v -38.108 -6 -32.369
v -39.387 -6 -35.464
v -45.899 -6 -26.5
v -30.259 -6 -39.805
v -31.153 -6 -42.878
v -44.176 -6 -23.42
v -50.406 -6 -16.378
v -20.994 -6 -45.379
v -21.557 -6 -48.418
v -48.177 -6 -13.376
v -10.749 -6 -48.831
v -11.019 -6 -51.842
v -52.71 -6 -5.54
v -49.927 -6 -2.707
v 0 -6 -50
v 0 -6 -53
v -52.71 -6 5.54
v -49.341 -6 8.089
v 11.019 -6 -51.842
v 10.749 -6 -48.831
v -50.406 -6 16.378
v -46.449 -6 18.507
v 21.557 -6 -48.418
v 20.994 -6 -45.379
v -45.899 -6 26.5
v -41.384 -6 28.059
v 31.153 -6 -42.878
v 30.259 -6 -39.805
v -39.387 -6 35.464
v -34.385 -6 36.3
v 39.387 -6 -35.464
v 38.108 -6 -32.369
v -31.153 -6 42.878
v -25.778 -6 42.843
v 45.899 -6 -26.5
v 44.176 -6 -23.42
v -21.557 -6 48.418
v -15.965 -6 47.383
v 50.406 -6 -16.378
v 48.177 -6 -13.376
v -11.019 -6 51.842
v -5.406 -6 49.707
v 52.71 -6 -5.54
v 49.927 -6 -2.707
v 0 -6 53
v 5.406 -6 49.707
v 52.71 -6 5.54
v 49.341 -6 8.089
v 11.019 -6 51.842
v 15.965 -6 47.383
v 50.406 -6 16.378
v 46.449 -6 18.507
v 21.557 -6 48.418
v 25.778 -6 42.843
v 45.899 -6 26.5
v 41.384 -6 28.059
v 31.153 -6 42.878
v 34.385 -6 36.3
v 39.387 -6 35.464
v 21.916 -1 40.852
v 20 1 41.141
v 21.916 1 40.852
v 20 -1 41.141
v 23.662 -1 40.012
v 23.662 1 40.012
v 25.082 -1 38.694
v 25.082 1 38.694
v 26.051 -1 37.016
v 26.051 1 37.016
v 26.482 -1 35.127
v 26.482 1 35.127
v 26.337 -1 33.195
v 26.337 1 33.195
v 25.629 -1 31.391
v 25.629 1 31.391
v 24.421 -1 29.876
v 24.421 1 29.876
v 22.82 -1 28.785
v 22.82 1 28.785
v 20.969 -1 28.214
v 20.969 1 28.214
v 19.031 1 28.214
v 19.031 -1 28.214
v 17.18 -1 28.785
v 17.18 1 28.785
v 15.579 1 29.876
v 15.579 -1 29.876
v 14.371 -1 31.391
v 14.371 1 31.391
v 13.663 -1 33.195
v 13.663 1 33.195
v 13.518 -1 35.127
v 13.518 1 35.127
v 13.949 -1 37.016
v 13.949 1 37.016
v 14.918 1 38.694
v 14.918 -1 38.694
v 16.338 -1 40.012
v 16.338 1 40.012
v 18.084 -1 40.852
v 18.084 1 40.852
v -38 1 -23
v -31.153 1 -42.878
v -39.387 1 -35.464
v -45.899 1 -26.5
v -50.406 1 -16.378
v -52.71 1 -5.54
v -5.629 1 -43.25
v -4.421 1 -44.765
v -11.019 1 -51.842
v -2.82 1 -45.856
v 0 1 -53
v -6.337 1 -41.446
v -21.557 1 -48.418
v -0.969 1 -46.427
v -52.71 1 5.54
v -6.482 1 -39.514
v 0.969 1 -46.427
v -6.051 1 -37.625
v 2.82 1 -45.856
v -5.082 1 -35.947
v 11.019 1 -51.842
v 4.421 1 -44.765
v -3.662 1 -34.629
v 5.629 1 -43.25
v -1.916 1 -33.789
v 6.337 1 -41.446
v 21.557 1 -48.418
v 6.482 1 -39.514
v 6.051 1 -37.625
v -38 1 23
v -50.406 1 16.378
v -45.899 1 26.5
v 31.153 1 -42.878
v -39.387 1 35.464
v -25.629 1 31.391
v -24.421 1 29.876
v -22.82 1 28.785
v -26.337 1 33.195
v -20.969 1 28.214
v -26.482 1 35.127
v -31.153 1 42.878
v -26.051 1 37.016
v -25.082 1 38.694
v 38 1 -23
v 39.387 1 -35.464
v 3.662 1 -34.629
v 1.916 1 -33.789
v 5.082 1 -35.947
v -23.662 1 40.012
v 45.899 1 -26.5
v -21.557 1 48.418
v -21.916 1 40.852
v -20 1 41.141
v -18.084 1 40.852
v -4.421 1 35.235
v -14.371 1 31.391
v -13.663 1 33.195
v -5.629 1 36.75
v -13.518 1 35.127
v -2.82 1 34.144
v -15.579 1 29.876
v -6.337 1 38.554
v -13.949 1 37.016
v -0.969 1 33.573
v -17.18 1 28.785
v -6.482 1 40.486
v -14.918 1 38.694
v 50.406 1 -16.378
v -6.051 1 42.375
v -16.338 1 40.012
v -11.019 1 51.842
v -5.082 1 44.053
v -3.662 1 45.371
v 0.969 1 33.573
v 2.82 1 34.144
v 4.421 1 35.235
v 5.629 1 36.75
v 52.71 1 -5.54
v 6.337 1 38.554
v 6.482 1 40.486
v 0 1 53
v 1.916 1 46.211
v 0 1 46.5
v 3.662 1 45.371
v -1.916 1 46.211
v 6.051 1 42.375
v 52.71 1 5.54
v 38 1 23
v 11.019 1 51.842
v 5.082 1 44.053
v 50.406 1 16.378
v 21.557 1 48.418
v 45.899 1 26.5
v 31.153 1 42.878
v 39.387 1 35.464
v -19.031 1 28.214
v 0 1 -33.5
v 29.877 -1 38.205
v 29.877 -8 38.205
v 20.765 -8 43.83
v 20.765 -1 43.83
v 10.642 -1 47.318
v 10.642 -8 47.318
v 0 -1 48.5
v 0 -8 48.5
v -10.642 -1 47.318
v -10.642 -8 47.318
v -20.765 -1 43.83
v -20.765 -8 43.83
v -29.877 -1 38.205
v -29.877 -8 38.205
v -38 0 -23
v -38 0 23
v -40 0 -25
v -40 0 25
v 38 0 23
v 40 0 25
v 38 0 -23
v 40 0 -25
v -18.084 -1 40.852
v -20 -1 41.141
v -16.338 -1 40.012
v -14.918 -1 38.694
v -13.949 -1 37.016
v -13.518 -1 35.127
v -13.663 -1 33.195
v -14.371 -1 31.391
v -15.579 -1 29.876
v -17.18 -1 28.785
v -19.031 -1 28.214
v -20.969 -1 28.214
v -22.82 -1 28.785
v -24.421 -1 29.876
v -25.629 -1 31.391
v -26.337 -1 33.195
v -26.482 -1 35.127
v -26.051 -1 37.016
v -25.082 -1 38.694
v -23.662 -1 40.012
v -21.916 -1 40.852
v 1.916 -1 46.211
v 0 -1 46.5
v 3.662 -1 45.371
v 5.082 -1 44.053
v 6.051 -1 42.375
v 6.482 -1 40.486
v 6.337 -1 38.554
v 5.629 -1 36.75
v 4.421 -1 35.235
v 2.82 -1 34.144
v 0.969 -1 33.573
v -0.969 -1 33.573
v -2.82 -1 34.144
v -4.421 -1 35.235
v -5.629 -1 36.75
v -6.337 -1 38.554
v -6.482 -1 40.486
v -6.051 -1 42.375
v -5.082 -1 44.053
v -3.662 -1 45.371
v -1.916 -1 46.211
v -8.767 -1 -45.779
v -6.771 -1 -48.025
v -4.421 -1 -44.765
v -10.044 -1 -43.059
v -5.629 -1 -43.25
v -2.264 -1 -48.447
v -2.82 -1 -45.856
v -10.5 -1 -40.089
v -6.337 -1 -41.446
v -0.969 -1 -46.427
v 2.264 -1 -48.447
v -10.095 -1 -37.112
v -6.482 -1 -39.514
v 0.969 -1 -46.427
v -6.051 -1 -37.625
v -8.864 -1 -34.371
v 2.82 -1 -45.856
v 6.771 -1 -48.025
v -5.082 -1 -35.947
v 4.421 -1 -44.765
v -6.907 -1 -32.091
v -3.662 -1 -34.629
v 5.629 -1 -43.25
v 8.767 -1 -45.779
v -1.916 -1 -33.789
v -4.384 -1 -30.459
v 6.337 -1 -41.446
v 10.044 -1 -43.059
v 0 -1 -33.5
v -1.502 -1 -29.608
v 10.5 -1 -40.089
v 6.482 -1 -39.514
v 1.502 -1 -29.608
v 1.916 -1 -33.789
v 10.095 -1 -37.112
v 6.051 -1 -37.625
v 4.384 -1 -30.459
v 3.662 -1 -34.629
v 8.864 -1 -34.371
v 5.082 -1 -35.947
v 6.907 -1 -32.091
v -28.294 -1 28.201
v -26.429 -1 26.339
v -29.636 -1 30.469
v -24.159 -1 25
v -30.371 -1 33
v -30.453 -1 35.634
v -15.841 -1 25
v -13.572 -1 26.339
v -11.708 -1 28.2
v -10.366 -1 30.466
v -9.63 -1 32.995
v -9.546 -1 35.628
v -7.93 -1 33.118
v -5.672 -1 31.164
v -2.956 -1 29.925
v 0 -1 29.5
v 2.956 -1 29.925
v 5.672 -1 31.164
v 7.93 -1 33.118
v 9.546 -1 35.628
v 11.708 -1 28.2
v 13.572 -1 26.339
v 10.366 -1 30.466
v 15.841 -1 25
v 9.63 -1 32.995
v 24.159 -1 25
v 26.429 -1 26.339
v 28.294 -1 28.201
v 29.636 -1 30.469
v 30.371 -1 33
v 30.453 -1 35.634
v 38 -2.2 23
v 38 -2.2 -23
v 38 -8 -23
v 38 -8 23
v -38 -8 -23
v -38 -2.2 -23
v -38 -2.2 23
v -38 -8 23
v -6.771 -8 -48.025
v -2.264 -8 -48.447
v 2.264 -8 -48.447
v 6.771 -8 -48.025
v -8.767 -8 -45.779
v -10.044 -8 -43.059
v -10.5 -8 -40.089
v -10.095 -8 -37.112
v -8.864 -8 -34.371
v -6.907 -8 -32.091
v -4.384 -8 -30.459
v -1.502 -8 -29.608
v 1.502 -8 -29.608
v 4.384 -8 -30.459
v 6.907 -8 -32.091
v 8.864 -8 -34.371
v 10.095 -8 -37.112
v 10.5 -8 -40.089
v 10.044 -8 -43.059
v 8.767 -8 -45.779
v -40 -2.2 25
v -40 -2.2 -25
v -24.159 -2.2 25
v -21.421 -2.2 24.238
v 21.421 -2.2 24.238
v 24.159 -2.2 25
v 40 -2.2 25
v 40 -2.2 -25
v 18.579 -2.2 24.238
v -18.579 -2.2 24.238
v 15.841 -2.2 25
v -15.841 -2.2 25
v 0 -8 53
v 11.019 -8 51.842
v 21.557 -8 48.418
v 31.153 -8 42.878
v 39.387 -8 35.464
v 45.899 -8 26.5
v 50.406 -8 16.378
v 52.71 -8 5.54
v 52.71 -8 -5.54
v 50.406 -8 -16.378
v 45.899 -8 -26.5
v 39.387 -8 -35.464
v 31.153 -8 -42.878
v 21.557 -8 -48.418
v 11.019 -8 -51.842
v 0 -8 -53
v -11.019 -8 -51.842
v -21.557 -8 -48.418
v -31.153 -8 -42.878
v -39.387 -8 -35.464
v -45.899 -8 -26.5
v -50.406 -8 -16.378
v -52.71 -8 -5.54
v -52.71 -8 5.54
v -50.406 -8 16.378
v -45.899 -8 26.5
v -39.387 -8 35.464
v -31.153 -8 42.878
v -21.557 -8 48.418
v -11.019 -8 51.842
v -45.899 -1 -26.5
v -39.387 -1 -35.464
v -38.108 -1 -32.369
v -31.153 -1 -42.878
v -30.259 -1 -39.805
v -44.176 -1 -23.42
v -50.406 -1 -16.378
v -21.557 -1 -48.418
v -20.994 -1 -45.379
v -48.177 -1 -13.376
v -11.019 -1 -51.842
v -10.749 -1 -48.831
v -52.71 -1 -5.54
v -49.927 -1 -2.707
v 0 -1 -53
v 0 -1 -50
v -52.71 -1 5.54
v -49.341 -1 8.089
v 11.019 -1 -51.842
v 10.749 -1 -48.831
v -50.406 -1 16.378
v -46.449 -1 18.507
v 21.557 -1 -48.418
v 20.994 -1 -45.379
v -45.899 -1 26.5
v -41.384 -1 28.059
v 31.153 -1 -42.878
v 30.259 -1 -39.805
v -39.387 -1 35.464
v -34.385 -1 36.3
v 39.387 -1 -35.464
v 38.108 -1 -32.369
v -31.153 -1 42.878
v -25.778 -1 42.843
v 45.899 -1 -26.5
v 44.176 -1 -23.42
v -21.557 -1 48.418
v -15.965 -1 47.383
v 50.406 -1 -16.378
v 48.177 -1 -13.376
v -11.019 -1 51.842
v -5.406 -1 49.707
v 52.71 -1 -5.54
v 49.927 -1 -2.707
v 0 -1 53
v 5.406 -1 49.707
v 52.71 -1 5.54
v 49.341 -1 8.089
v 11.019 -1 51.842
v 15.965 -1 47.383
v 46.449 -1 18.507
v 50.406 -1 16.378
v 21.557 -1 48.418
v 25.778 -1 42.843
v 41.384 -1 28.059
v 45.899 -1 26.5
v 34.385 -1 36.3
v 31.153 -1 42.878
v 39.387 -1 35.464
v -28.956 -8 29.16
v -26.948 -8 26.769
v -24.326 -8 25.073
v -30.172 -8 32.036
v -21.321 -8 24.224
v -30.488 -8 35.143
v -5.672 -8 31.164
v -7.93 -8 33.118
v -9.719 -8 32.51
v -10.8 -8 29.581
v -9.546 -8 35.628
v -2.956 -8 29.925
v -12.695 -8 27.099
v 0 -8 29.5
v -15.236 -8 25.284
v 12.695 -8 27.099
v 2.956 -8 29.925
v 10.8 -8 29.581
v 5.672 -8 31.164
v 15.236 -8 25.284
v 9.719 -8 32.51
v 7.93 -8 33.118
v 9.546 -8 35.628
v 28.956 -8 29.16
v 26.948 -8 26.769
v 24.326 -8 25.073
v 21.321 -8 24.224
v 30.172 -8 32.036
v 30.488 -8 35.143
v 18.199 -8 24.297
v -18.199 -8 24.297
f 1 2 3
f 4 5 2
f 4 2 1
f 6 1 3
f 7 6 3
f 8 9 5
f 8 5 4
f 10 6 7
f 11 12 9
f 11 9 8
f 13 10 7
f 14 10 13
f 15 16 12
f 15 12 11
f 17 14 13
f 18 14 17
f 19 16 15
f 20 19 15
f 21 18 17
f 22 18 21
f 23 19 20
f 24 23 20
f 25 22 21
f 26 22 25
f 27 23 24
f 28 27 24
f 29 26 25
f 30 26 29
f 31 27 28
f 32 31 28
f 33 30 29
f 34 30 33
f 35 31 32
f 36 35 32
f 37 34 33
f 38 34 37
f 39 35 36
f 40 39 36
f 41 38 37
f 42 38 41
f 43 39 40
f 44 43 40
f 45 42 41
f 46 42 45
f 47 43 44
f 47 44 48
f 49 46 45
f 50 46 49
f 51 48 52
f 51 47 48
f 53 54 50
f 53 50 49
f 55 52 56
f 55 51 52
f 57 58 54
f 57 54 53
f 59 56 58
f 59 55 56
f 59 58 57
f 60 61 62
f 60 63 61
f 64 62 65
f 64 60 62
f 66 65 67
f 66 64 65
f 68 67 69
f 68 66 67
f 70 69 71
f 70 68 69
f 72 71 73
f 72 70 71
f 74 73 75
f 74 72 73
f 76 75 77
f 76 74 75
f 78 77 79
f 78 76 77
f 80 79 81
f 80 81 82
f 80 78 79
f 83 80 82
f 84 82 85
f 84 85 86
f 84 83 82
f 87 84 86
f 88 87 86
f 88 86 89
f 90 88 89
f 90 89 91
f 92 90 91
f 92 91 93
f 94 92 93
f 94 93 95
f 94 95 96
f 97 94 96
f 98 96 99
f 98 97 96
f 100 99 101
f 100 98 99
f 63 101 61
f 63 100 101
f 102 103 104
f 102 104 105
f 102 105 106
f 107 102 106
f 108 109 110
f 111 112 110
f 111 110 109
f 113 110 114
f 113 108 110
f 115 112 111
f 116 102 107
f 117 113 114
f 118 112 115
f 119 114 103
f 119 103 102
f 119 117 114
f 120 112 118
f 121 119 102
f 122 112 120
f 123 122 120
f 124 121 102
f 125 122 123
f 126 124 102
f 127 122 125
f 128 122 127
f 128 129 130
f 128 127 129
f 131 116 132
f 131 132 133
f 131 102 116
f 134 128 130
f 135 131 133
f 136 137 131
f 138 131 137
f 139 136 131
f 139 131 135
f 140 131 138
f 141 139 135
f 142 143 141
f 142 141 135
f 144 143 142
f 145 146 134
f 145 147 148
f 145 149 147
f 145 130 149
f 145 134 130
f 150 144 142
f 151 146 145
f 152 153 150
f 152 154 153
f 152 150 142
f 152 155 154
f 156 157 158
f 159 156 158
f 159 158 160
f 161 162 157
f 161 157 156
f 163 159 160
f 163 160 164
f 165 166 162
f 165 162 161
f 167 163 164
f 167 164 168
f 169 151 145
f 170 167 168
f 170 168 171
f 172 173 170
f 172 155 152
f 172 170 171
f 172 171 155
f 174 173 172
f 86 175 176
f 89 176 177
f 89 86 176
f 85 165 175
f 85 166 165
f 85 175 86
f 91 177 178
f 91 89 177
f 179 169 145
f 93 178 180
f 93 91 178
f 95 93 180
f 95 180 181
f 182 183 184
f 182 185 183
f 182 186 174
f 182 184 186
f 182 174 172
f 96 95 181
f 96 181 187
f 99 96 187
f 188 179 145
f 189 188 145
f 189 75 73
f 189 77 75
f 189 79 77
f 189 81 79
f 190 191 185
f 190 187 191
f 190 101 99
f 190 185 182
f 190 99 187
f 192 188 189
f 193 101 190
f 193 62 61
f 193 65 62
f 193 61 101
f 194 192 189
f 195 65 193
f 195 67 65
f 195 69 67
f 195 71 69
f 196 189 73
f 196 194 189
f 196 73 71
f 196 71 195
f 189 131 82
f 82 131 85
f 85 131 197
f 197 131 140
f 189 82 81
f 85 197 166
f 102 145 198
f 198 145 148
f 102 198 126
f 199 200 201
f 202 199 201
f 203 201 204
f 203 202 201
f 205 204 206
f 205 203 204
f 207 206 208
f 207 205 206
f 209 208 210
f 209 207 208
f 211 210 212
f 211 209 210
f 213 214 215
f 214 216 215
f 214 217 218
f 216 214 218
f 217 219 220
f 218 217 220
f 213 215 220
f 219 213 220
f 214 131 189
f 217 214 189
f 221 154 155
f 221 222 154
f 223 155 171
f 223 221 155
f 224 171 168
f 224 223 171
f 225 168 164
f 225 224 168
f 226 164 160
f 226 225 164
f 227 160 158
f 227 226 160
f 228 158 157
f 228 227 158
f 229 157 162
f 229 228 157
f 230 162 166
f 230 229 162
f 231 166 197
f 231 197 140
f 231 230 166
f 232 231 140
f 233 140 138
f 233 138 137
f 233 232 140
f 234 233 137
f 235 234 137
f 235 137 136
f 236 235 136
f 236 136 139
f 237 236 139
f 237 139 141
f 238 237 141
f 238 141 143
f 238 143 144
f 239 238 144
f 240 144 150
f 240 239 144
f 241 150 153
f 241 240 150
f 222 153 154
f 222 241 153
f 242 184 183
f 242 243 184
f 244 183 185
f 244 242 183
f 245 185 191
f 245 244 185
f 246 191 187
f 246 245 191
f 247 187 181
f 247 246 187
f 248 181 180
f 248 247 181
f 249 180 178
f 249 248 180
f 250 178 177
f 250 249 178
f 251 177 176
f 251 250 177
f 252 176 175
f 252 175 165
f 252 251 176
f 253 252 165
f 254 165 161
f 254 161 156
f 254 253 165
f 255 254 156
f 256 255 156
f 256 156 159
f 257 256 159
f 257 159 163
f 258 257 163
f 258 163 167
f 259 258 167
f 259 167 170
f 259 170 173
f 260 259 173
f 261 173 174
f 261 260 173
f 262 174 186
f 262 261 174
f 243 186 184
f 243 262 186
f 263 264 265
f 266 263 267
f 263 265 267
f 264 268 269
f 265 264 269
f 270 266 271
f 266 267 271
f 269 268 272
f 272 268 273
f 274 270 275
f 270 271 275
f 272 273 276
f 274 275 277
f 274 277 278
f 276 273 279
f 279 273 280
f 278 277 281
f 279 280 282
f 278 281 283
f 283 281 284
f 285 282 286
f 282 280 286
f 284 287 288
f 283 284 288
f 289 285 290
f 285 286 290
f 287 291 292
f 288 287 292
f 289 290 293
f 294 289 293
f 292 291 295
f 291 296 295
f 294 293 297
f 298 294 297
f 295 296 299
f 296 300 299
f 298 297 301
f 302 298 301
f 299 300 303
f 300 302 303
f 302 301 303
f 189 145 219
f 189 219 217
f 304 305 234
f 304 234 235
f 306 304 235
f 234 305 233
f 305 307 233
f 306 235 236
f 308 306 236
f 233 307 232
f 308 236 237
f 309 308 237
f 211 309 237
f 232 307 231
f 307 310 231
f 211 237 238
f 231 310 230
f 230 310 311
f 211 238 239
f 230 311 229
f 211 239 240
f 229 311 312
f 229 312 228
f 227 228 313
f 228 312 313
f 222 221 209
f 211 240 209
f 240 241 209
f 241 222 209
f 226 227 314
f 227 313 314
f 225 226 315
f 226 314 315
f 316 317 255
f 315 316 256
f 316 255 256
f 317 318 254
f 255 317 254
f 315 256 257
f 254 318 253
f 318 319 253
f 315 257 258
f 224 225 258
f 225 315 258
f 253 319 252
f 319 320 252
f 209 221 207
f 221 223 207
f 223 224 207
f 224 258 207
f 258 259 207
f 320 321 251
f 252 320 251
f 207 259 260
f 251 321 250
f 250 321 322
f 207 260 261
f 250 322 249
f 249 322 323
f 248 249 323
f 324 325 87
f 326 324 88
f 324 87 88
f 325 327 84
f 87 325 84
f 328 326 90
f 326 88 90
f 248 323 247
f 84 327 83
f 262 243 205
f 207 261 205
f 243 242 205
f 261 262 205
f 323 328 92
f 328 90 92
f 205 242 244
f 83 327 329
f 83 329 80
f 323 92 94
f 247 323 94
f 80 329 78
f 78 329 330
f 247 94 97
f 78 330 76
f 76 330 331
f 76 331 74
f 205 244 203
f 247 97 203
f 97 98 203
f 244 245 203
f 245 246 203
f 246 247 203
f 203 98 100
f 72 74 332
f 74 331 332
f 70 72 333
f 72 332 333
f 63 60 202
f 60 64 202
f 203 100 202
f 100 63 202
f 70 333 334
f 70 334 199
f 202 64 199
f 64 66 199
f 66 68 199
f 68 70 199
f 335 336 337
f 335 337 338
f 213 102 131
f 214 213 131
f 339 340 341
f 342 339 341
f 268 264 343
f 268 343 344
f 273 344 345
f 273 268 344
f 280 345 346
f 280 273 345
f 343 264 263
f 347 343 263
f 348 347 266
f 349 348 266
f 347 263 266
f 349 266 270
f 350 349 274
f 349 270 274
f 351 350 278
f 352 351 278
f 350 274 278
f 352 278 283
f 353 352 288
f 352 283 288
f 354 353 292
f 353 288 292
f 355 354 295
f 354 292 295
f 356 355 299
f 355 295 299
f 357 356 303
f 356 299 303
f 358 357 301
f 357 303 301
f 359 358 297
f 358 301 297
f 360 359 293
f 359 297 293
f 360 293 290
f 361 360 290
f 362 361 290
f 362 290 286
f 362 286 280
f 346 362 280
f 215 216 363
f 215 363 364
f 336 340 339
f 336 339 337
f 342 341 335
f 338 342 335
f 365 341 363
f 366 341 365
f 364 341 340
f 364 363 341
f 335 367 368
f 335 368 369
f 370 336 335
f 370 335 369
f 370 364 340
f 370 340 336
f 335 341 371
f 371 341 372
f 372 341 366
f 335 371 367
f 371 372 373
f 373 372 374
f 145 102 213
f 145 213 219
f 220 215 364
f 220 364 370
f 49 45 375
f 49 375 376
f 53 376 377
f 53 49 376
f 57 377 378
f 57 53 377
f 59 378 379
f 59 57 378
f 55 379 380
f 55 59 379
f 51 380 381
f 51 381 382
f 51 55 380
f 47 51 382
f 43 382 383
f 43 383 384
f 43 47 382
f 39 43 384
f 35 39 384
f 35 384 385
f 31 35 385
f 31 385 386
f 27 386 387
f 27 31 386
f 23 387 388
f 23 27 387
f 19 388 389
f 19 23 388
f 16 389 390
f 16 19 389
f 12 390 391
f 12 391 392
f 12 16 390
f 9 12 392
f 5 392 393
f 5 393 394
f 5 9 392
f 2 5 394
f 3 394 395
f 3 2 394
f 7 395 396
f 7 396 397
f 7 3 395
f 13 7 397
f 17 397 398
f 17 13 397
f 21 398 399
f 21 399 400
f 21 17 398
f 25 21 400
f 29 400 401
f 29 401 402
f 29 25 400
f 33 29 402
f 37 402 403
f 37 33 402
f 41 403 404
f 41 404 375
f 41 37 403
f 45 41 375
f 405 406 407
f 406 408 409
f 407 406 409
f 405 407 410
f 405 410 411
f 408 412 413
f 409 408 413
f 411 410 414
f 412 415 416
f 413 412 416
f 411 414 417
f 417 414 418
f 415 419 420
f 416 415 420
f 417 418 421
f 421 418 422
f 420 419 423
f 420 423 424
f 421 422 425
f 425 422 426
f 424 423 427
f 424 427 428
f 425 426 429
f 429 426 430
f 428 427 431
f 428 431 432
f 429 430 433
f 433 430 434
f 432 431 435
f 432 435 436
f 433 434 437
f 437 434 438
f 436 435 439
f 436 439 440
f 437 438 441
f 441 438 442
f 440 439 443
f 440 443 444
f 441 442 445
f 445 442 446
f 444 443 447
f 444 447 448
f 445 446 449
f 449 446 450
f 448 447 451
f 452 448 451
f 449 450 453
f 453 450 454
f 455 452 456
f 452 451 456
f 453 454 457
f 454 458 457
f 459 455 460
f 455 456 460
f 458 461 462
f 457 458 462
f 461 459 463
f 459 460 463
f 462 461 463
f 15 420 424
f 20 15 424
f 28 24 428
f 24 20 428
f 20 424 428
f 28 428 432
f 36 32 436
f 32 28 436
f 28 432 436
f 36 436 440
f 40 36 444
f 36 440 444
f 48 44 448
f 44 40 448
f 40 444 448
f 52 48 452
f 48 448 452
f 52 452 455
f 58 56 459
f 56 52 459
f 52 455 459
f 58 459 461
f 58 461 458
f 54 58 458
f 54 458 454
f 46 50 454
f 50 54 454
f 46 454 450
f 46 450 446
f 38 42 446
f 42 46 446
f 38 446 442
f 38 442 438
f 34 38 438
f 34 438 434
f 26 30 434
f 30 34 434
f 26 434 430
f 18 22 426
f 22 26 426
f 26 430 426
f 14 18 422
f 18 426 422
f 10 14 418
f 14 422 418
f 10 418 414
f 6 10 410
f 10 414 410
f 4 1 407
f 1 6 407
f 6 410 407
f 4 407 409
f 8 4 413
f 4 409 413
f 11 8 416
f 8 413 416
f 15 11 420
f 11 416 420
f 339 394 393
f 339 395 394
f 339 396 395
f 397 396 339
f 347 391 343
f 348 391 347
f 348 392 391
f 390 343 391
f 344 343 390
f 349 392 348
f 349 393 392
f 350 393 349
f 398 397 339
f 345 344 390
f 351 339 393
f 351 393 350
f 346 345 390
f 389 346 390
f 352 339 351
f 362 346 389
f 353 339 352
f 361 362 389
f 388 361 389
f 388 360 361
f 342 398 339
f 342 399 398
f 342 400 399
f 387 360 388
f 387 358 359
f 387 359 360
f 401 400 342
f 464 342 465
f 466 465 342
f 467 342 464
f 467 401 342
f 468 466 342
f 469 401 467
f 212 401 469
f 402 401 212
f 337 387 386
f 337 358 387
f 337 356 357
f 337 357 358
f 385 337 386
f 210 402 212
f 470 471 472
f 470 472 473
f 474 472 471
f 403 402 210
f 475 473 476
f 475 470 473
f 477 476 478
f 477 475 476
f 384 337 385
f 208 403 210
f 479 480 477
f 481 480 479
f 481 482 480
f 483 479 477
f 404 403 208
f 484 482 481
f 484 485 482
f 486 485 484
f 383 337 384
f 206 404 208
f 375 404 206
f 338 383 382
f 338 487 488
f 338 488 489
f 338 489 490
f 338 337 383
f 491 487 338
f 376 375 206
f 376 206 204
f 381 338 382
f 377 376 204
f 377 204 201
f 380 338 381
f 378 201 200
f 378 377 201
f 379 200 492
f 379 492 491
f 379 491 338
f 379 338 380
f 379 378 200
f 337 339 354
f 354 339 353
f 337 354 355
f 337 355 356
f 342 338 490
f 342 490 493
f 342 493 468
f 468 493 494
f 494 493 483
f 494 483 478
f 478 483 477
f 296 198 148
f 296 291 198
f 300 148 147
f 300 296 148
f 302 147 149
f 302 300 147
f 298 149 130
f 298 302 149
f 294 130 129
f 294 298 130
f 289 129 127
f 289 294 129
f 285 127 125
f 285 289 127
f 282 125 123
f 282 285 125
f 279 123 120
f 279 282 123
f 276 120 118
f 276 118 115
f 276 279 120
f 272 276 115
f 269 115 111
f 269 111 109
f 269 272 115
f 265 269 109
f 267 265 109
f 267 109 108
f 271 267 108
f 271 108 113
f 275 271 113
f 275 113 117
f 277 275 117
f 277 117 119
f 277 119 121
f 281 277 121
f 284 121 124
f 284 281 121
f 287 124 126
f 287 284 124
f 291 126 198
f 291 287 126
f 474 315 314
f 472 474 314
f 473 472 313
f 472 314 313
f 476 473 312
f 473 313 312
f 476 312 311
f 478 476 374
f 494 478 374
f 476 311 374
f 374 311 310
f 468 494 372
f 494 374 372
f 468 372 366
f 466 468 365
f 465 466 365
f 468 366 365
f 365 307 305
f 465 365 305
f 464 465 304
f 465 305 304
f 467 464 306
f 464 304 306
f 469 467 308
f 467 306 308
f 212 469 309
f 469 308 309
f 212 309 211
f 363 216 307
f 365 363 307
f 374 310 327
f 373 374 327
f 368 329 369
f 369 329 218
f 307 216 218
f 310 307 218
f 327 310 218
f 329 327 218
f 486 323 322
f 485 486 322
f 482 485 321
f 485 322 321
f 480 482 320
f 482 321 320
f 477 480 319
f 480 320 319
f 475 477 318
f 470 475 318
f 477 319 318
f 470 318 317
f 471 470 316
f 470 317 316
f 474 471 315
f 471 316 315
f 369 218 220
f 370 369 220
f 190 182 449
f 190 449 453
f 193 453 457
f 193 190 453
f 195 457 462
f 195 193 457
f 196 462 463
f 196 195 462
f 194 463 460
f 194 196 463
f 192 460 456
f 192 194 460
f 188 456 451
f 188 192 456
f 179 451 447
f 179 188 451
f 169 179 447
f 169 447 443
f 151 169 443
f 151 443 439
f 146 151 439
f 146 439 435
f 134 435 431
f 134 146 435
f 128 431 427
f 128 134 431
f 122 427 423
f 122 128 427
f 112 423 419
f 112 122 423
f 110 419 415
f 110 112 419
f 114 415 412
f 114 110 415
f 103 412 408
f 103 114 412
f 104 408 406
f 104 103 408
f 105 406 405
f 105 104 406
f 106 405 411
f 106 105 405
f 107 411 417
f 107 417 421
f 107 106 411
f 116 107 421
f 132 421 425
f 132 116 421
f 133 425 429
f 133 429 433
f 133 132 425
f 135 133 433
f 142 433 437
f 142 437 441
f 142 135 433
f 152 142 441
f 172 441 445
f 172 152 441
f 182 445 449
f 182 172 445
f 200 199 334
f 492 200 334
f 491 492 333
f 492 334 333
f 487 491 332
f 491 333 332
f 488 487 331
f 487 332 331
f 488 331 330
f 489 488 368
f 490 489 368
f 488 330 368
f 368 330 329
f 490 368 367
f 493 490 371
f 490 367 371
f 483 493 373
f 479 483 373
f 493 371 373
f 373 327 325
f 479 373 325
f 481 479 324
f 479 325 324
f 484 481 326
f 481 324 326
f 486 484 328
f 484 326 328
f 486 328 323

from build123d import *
from build123d.topology import SkipClean

# Parameters (mm, degrees)
SKETCH1_R           = 50
SKETCH1_R_2         = 6.5
SKETCH1_W           = 76
SKETCH1_H           = 46
BOSS_EXTRUDE1_DEPTH = 1
SKETCH2_R           = 50
SKETCH2_R_2         = 48.5
BOSS_EXTRUDE2_DEPTH = 7
SKETCH3_R           = 53
SKETCH3_R_2         = 50
BOSS_EXTRUDE3_DEPTH = 2
BOSS_EXTRUDE4_START = -7
SKETCH3_2_R         = 53
SKETCH3_2_R_2       = 50
BOSS_EXTRUDE4_DEPTH = 2
SKETCH5_W           = 76
SKETCH5_H           = 46
BOSS_EXTRUDE5_DEPTH = 7
SKETCH4_W           = 80
SKETCH4_H           = 50
CUT_EXTRUDE1_DEPTH  = 2.2


with BuildPart() as part:
    # Sketch1 → Boss-Extrude1 (new, symmetric)
    with BuildSketch(Plane(origin=(0, 0, 0), x_dir=(1, 0, 0), z_dir=(0, 1, 0))):
        with Locations(Location((0, 0, 0), (0, 0, 270))):
            Circle(SKETCH1_R)
        with Locations(Location((0, 40, 0), (0, 0, 270))):
            Circle(SKETCH1_R_2, mode=Mode.SUBTRACT)
        with Locations(Location((0, -40, 0), (0, 0, 270))):
            Circle(SKETCH1_R_2, mode=Mode.SUBTRACT)
        with Locations(Location((20, -34.641016151, 0), (0, 0, 270))):
            Circle(SKETCH1_R_2, mode=Mode.SUBTRACT)
        with Locations(Location((-20, -34.641016151, 0), (0, 0, 270))):
            Circle(SKETCH1_R_2, mode=Mode.SUBTRACT)
        Rectangle(SKETCH1_W, SKETCH1_H, mode=Mode.SUBTRACT)
    extrude(amount=BOSS_EXTRUDE1_DEPTH, both=True)

    # Sketch2 → Boss-Extrude2 (add)
    with SkipClean():  # the faces are left unmerged after this step: merging them gives an invalid solid
        with BuildSketch(Plane.XZ.offset(1)):
            with Locations(Location((0, 0, 0), (0, 0, 270))):
                Circle(SKETCH2_R)
            with Locations(Location((0, 0, 0), (0, 0, 270))):
                Circle(SKETCH2_R_2, mode=Mode.SUBTRACT)
        extrude(amount=BOSS_EXTRUDE2_DEPTH)

    # Sketch3 → Boss-Extrude3 (add)
    with BuildSketch(Plane(origin=(0, 1, 0), x_dir=(1, 0, 0), z_dir=(0, 1, 0))):
        with Locations(Location((0, 0, 0), (0, 0, 270))):
            Circle(SKETCH3_R)
        with Locations(Location((0, 0, 0), (0, 0, 90))):
            Circle(SKETCH3_R_2, mode=Mode.SUBTRACT)
    extrude(amount=-BOSS_EXTRUDE3_DEPTH)

    # Sketch3<2> → Boss-Extrude4 (add)
    with BuildSketch(Plane(origin=(0, 1, 0), x_dir=(1, 0, 0), z_dir=(0, 1, 0)).offset(BOSS_EXTRUDE4_START)):
        with Locations(Location((0, 0, 0), (0, 0, 270))):
            Circle(SKETCH3_2_R)
        with Locations(Location((0, 0, 0), (0, 0, 90))):
            Circle(SKETCH3_2_R_2, mode=Mode.SUBTRACT)
    extrude(amount=-BOSS_EXTRUDE4_DEPTH)

    # Sketch5 → Boss-Extrude5 (add, through all)
    with BuildSketch(Plane.XZ.offset(1)):
        with BuildLine():
            ThreePointArc((29.876545638, 38.205261689), (21.320536736, 24.224386047), (9.54648854, 35.627980267))
            ThreePointArc((9.54648854, 35.627980267), (0, 29.5), (-9.54648854, 35.627980267))
            ThreePointArc((-9.54648854, 35.627980267), (-21.320536736, 24.224386047), (-29.876545638, 38.205261689))
            ThreePointArc((-29.876545638, 38.205261689), (-46.847402575, -12.552723687), (-6.771216656, -48.025))
            ThreePointArc((-6.771216656, -48.025), (0, -29.5), (6.771216656, -48.025))
            ThreePointArc((6.771216656, -48.025), (46.847402575, -12.552723687), (29.876545638, 38.205261689))
        make_face()
        Rectangle(SKETCH5_W, SKETCH5_H, mode=Mode.SUBTRACT)
    extrude(amount=BOSS_EXTRUDE5_DEPTH)

    # Sketch4 → Cut-Extrude1 (cut)
    with BuildSketch(Plane(origin=(0, 0, 0), x_dir=(1, 0, 0), z_dir=(0, 1, 0))):
        Rectangle(SKETCH4_W, SKETCH4_H)
    extrude(amount=-CUT_EXTRUDE1_DEPTH, mode=Mode.SUBTRACT)


solid = part.part
